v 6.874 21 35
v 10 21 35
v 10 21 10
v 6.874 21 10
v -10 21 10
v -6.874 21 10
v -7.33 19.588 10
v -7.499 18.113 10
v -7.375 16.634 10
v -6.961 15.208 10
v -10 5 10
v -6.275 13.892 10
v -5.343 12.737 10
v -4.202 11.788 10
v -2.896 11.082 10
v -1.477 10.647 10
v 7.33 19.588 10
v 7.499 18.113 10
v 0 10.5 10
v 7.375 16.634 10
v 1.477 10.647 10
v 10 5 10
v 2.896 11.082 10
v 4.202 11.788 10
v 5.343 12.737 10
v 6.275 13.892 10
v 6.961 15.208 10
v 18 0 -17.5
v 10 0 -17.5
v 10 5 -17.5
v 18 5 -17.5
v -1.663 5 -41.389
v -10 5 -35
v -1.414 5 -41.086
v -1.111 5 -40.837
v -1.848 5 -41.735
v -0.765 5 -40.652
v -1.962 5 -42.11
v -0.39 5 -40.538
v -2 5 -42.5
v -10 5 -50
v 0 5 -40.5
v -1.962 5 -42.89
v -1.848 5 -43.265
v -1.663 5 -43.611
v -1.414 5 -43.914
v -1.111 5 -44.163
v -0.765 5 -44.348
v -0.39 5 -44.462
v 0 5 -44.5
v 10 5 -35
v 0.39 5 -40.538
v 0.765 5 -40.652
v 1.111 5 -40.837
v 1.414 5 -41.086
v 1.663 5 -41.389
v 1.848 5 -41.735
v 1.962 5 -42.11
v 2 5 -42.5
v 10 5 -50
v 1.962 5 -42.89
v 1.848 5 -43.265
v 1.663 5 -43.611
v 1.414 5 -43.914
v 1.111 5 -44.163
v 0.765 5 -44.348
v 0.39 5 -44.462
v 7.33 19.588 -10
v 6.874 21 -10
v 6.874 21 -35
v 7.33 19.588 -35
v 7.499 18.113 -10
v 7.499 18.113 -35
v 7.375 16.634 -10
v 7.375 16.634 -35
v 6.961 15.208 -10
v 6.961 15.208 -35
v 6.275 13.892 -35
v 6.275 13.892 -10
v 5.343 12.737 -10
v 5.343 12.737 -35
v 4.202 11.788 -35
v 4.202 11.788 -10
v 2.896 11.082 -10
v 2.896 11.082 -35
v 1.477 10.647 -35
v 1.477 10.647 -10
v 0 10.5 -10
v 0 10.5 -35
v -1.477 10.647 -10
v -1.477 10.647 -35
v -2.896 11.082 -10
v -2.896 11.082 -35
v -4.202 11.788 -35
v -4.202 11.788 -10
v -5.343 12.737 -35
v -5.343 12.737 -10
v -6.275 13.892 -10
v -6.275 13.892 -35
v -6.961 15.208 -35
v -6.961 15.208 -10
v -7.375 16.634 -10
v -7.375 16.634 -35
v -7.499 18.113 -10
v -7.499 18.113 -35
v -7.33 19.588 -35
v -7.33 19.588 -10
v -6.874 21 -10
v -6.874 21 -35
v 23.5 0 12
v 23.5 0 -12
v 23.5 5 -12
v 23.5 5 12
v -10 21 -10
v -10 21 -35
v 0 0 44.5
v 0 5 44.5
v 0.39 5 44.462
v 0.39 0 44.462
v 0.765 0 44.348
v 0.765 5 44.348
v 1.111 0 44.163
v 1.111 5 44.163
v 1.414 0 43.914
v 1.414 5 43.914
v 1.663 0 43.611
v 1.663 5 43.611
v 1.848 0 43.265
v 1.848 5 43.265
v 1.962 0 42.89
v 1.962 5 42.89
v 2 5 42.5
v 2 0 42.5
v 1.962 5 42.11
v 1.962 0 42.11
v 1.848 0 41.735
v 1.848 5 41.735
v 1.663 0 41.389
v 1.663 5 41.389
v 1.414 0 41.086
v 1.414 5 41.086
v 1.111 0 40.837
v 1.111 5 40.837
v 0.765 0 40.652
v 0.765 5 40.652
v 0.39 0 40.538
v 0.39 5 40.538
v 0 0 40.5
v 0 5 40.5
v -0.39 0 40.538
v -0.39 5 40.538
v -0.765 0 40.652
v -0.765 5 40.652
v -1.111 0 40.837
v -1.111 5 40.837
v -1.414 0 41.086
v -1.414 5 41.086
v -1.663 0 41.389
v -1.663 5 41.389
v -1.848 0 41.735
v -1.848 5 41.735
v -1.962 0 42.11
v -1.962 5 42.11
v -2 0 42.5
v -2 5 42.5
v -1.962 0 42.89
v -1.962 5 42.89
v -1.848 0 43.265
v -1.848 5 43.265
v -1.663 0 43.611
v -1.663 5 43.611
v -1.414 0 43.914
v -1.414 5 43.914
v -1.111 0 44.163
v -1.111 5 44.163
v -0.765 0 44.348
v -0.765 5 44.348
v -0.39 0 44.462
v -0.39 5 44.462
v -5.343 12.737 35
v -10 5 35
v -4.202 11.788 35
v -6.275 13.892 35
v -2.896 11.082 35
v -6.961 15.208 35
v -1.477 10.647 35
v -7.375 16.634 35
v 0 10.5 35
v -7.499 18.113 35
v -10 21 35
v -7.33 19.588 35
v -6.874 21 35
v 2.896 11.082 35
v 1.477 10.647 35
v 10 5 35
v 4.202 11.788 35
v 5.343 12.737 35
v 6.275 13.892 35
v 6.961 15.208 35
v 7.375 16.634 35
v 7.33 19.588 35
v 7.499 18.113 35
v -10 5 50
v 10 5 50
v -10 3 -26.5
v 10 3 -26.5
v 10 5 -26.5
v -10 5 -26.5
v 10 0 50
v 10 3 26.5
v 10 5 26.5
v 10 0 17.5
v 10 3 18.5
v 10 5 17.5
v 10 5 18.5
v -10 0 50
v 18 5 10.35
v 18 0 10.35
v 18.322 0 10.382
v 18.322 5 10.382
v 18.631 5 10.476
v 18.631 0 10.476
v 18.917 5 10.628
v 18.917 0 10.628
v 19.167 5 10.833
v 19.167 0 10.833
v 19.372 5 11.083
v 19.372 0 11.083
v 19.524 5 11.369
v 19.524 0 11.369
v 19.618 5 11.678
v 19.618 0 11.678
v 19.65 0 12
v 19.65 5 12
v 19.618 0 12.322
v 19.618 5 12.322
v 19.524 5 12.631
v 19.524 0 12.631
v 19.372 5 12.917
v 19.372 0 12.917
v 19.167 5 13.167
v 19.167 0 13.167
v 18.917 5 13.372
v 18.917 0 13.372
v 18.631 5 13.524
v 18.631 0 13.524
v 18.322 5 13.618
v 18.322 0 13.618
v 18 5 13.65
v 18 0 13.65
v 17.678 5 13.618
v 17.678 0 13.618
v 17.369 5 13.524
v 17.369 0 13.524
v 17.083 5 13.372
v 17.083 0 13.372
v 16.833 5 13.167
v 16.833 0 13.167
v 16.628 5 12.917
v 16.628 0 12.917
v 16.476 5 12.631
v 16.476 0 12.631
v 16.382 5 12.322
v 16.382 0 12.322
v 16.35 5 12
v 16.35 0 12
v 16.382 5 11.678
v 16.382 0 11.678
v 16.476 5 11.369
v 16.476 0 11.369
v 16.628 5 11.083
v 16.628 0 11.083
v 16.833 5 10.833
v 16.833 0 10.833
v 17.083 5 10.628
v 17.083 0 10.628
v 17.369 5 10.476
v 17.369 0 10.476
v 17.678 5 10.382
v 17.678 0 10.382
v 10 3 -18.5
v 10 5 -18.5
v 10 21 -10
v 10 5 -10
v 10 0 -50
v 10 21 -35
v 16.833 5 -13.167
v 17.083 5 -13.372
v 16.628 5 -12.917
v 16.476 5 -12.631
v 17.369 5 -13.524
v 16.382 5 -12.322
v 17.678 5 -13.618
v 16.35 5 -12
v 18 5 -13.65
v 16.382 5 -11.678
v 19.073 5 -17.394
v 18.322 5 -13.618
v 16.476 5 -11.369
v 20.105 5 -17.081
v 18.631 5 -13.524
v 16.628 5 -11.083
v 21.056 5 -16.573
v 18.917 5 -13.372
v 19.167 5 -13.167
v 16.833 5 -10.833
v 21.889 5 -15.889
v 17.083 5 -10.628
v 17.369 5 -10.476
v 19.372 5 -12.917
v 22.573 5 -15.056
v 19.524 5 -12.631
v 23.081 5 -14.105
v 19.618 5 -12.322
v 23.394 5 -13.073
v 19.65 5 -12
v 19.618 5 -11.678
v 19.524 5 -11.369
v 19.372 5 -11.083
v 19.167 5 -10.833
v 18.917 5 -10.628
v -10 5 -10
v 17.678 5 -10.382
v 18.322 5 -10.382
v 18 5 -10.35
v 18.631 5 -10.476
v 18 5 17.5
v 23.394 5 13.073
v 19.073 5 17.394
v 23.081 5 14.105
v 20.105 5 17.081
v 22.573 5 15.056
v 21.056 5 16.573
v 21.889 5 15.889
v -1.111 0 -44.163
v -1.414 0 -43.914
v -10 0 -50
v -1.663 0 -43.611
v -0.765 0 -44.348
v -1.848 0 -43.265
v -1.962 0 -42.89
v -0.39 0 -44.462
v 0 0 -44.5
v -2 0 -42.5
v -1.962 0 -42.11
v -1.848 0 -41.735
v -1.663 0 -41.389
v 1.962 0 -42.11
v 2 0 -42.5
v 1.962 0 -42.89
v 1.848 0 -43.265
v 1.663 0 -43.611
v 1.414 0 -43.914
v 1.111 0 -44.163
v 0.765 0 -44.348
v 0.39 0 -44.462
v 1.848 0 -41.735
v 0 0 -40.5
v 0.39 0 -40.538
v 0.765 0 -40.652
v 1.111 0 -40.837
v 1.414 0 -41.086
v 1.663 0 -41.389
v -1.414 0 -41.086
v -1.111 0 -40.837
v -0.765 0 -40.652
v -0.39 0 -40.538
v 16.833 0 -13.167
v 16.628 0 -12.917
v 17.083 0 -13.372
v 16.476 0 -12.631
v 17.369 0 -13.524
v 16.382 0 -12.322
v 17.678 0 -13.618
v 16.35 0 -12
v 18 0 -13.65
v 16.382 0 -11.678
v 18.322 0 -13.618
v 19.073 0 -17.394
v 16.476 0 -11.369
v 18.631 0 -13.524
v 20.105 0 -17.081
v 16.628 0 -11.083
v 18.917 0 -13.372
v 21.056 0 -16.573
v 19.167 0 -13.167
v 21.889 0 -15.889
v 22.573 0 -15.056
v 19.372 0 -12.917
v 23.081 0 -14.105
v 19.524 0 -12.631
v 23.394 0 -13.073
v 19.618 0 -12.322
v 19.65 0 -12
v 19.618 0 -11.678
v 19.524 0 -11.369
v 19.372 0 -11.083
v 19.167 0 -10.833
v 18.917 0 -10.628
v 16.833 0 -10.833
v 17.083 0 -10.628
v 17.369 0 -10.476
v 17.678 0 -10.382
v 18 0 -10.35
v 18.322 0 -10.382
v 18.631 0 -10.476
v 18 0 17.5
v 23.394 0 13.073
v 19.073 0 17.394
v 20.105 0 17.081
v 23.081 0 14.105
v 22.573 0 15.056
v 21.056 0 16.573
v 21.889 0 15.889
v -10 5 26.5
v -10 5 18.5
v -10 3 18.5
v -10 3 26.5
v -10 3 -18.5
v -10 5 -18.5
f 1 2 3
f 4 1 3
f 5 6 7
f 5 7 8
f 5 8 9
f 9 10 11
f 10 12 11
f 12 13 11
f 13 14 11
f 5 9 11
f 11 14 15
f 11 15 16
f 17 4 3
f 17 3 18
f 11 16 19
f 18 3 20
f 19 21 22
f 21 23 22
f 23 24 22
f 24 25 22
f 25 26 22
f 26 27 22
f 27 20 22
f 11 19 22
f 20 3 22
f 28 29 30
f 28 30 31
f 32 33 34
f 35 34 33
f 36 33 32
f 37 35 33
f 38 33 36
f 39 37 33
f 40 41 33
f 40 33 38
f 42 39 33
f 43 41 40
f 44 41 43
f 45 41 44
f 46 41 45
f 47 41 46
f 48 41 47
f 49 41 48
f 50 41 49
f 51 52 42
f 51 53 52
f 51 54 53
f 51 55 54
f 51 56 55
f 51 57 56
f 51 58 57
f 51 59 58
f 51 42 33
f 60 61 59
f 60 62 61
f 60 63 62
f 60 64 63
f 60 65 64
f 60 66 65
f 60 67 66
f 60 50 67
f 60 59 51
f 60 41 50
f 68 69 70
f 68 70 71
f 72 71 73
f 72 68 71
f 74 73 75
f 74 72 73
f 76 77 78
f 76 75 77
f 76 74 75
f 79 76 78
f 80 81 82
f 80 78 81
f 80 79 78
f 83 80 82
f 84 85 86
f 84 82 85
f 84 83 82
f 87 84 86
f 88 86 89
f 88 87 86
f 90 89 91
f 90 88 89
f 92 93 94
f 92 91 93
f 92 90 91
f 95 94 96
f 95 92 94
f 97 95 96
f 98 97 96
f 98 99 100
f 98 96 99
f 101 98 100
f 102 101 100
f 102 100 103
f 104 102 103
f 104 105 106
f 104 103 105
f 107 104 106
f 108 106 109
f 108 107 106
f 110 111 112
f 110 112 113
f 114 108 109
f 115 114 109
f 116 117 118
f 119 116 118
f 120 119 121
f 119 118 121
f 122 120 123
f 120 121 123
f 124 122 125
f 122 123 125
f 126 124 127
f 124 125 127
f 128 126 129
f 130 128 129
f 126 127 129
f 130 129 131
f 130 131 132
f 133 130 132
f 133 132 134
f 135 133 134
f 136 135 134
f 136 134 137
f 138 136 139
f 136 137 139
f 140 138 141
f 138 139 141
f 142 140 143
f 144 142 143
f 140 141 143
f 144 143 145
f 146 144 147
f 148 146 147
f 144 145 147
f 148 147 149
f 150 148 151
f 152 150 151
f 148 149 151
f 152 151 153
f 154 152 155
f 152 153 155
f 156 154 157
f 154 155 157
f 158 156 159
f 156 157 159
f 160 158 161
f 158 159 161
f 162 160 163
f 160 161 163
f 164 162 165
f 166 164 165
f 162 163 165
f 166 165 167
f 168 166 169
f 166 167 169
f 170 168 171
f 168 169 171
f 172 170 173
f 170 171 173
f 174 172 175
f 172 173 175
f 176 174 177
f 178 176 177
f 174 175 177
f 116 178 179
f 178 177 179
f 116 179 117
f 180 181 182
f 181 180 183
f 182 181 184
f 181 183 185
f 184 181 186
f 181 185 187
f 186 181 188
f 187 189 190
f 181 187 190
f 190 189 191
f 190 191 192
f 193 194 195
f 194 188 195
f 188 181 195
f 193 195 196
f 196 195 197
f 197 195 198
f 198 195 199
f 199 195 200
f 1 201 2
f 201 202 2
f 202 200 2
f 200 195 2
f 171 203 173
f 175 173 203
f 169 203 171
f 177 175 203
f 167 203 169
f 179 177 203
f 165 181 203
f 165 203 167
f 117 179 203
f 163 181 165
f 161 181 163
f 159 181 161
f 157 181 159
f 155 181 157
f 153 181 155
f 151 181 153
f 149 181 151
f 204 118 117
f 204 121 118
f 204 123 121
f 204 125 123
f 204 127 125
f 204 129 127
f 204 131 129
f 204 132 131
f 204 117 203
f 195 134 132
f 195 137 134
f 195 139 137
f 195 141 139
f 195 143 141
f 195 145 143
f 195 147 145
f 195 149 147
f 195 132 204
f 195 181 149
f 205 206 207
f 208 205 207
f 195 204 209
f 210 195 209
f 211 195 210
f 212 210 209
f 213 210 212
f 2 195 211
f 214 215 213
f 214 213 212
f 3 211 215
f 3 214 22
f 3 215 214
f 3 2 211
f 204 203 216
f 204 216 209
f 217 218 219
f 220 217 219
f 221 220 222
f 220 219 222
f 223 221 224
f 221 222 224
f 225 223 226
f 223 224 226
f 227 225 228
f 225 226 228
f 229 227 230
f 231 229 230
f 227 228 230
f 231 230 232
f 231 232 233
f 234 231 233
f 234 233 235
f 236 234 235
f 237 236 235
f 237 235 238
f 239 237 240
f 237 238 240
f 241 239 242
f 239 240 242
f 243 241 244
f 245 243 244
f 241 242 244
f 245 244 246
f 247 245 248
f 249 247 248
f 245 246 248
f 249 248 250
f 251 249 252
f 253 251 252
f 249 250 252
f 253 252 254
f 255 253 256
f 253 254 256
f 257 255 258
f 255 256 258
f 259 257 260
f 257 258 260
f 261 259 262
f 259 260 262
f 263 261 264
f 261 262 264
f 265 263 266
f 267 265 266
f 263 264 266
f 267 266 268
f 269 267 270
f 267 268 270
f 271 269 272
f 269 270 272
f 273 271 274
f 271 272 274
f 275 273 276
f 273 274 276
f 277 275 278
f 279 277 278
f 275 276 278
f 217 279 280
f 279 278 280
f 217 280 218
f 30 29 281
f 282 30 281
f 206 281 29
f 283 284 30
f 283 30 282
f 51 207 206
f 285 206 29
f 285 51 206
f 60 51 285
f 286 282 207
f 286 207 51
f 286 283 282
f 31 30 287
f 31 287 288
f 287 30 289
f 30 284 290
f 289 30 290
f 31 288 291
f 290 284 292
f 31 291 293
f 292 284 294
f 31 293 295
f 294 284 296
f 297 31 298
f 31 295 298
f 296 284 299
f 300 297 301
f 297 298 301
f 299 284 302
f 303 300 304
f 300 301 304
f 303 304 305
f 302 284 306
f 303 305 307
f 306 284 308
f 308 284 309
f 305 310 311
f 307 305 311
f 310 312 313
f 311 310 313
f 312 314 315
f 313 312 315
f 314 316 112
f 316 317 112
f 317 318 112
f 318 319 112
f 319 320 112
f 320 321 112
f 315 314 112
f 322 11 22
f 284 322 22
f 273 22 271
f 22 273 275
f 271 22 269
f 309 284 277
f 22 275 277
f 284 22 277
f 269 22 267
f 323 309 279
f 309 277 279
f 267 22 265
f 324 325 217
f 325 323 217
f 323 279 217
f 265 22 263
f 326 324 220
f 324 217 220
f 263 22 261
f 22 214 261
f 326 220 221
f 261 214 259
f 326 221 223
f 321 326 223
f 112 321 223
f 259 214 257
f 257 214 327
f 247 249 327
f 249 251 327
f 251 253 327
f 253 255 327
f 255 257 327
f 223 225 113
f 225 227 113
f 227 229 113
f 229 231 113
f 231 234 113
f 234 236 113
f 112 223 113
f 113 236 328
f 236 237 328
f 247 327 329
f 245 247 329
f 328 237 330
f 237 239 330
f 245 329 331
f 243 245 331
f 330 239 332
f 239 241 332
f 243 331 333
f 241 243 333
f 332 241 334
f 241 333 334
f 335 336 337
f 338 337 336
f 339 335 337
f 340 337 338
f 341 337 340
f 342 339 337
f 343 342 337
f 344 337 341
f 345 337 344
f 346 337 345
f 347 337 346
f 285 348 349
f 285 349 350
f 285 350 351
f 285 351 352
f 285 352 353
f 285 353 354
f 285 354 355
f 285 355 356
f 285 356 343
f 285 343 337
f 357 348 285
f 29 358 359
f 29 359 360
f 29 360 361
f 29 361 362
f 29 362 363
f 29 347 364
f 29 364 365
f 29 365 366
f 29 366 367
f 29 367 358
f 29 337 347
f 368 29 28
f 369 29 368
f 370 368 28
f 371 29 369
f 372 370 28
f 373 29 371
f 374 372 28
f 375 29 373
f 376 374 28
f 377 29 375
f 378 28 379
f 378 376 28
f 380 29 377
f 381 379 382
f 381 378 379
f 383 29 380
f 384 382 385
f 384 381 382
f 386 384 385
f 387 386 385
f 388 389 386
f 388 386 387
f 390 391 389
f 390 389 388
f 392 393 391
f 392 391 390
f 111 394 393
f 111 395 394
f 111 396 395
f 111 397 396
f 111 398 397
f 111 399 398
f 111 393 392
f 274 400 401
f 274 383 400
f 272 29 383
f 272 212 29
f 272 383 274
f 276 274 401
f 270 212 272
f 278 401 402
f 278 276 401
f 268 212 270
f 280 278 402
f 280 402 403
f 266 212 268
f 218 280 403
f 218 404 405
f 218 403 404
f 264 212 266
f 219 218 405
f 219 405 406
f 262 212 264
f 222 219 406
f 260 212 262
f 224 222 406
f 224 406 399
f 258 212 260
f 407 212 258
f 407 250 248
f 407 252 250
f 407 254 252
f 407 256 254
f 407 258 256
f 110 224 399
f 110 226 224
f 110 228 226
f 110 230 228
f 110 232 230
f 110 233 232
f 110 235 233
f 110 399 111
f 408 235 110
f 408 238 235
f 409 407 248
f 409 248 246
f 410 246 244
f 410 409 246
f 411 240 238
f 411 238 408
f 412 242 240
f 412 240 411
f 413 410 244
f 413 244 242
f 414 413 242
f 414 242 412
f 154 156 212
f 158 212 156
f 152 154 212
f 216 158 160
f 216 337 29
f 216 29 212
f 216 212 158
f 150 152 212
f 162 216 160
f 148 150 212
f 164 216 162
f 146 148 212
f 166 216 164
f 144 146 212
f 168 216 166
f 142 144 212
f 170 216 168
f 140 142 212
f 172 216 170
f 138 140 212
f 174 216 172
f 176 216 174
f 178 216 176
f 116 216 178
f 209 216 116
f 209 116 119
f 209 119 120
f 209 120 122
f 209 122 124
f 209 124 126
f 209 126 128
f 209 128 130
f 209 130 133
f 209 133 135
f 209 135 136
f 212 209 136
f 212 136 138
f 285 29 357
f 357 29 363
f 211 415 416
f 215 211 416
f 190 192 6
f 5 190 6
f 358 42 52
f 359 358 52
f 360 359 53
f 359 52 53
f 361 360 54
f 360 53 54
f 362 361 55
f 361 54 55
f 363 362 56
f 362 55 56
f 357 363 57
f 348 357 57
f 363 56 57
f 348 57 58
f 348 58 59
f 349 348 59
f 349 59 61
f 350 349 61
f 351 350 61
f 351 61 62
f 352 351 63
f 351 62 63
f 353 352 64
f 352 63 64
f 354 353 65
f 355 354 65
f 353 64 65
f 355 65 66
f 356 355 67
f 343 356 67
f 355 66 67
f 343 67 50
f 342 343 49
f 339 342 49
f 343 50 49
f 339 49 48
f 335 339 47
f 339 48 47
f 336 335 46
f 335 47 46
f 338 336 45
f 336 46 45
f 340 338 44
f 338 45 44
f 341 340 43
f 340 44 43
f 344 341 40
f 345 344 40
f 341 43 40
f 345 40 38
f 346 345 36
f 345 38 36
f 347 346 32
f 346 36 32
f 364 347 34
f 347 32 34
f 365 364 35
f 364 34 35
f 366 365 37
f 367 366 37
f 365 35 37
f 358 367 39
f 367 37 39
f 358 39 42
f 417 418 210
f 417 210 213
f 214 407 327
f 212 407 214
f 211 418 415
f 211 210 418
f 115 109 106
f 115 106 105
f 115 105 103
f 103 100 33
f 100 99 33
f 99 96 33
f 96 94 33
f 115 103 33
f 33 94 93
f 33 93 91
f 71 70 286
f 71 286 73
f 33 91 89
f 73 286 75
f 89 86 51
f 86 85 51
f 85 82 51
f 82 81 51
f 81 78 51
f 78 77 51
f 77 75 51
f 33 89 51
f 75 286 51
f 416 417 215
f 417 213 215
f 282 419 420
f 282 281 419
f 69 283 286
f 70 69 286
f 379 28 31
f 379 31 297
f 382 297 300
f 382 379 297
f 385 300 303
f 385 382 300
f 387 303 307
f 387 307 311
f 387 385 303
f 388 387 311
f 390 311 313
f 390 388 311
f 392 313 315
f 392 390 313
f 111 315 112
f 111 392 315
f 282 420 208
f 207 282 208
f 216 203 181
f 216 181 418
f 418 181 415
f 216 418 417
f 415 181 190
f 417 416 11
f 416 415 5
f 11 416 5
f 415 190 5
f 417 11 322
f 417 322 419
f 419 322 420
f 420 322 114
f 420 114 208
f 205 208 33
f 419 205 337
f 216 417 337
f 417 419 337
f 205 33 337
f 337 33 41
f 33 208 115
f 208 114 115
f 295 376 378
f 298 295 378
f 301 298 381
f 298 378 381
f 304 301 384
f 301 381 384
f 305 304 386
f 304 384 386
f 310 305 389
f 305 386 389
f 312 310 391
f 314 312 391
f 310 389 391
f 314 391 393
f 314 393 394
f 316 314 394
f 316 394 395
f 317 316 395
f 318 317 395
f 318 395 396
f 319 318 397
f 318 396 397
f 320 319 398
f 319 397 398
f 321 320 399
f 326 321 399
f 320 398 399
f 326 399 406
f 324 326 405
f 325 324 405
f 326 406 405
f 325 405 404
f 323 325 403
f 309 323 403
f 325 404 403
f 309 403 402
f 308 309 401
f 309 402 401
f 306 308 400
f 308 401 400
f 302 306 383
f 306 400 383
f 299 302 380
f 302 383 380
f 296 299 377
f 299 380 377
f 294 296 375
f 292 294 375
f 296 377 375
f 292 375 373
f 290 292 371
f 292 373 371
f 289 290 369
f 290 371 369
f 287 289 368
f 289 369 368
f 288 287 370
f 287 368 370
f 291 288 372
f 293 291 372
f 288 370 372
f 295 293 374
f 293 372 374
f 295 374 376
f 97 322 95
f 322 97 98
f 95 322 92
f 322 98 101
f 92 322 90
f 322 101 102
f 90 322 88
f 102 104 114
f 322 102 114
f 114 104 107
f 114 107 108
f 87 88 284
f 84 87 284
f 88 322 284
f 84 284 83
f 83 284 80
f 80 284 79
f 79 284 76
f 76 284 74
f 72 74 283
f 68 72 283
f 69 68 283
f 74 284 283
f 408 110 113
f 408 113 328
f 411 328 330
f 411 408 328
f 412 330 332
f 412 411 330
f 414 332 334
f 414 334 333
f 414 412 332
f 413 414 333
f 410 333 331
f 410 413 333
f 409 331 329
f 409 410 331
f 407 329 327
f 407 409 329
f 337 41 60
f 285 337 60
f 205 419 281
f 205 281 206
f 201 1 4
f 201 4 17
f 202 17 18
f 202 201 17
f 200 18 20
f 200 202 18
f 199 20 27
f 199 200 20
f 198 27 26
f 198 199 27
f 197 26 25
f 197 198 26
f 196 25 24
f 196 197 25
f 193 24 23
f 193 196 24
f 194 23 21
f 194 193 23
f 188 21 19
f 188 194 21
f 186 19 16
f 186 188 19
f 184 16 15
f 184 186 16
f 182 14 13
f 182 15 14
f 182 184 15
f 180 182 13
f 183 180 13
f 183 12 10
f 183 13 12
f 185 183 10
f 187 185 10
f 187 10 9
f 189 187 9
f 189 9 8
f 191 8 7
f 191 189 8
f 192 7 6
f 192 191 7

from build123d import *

# Parameters (mm, degrees)
ESBO_O1_W                = 8
ESBO_O1_H                = 2
RESSALTO_EXTRUS_O1_DEPTH = 10
CORTE_EXTRUS_O1_REACH    = 75.763
ESBO_O4_W                = 20
ESBO_O4_H                = 15
ESBO_O4_R                = 2
RESSALTO_EXTRUS_O2_DEPTH = 5
ESBO_O5_R                = 1.65
RESSALTO_EXTRUS_O3_DEPTH = 5


with BuildPart() as part:
    # Esboço1 → Ressalto-extrusão1 (new, symmetric)
    with BuildSketch(Plane(origin=(0, 0, 0), x_dir=(0, 0, -1), z_dir=(1, 0, 0))):
        Polygon((-35, 21), (-10, 21), (-10, 5), (10, 5), (10, 21), (35, 21), (35, 0), (-35, 0), align=None)
        with Locations((-22.5, 4)):
            Rectangle(ESBO_O1_W, ESBO_O1_H, mode=Mode.SUBTRACT)
        with Locations((22.5, 4)):
            Rectangle(ESBO_O1_W, ESBO_O1_H, mode=Mode.SUBTRACT)
    extrude(amount=RESSALTO_EXTRUS_O1_DEPTH, both=True)

    # Corte-extrusão1: up to this face of the body (flat: up to its plane)
    corte_extrus_o1_end = Plane(part.part.faces().sort_by_distance((0, 10.5, -35))[0])
    # Esboço2 → Corte-extrusão1 (cut, up to the picked face)
    with BuildSketch(Plane.XY.offset(35), mode=Mode.PRIVATE) as corte_extrus_o1_sk1:
        with BuildLine():
            Line((-6.873863542, 21), (6.873863542, 21))
            ThreePointArc((6.873863542, 21), (0, 10.5), (-6.873863542, 21))
        make_face()
    corte_extrus_o1_tool1 = split(extrude(corte_extrus_o1_sk1.sketch, amount=-CORTE_EXTRUS_O1_REACH, mode=Mode.PRIVATE), bisect_by=corte_extrus_o1_end, keep=Keep.BOTH, mode=Mode.PRIVATE)
    add(corte_extrus_o1_tool1.solids().sort_by(Axis((0, 16.361219, 35), (0, 0, -1)))[0], mode=Mode.SUBTRACT)

    # Esboço4 → Ressalto-extrusão2 (add)
    # profile 1 of 2: a face of its own
    with BuildSketch(Plane(origin=(0, 5, 0), x_dir=(1, 0, 0), z_dir=(0, 1, 0))):
        with Locations((0, 42.5)):
            Rectangle(ESBO_O4_W, ESBO_O4_H)
        with Locations(Location((0, 42.5, 0), (0, 0, 270))):
            Circle(ESBO_O4_R, mode=Mode.SUBTRACT)
    # profile 2 of 2: a face of its own
    with BuildSketch(Plane(origin=(0, 5, 0), x_dir=(1, 0, 0), z_dir=(0, 1, 0))):
        with Locations((0, -42.5)):
            Rectangle(ESBO_O4_W, ESBO_O4_H)
        with Locations(Location((0, -42.5, 0), (0, 0, 270))):
            Circle(ESBO_O4_R, mode=Mode.SUBTRACT)
    extrude(amount=-RESSALTO_EXTRUS_O2_DEPTH)

    # Esboço5 → Ressalto-extrusão3 (add)
    with BuildSketch(Plane.XZ):
        with BuildLine():
            Line((18, 17.5), (10, 17.5))
            Line((10, 17.5), (10, -17.5))
            Line((10, -17.5), (18, -17.5))
            ThreePointArc((18, -17.5), (21.889087297, -15.889087297), (23.5, -12))
            Line((23.5, -12), (23.5, 12))
            ThreePointArc((23.5, 12), (21.889087297, 15.889087297), (18, 17.5))
        make_face()
        with Locations(Location((18, 12, 0), (0, 0, 270))):
            Circle(ESBO_O5_R, mode=Mode.SUBTRACT)
        with Locations(Location((18, -12, 0), (0, 0, 270))):
            Circle(ESBO_O5_R, mode=Mode.SUBTRACT)
    extrude(amount=-RESSALTO_EXTRUS_O3_DEPTH)


solid = part.part
